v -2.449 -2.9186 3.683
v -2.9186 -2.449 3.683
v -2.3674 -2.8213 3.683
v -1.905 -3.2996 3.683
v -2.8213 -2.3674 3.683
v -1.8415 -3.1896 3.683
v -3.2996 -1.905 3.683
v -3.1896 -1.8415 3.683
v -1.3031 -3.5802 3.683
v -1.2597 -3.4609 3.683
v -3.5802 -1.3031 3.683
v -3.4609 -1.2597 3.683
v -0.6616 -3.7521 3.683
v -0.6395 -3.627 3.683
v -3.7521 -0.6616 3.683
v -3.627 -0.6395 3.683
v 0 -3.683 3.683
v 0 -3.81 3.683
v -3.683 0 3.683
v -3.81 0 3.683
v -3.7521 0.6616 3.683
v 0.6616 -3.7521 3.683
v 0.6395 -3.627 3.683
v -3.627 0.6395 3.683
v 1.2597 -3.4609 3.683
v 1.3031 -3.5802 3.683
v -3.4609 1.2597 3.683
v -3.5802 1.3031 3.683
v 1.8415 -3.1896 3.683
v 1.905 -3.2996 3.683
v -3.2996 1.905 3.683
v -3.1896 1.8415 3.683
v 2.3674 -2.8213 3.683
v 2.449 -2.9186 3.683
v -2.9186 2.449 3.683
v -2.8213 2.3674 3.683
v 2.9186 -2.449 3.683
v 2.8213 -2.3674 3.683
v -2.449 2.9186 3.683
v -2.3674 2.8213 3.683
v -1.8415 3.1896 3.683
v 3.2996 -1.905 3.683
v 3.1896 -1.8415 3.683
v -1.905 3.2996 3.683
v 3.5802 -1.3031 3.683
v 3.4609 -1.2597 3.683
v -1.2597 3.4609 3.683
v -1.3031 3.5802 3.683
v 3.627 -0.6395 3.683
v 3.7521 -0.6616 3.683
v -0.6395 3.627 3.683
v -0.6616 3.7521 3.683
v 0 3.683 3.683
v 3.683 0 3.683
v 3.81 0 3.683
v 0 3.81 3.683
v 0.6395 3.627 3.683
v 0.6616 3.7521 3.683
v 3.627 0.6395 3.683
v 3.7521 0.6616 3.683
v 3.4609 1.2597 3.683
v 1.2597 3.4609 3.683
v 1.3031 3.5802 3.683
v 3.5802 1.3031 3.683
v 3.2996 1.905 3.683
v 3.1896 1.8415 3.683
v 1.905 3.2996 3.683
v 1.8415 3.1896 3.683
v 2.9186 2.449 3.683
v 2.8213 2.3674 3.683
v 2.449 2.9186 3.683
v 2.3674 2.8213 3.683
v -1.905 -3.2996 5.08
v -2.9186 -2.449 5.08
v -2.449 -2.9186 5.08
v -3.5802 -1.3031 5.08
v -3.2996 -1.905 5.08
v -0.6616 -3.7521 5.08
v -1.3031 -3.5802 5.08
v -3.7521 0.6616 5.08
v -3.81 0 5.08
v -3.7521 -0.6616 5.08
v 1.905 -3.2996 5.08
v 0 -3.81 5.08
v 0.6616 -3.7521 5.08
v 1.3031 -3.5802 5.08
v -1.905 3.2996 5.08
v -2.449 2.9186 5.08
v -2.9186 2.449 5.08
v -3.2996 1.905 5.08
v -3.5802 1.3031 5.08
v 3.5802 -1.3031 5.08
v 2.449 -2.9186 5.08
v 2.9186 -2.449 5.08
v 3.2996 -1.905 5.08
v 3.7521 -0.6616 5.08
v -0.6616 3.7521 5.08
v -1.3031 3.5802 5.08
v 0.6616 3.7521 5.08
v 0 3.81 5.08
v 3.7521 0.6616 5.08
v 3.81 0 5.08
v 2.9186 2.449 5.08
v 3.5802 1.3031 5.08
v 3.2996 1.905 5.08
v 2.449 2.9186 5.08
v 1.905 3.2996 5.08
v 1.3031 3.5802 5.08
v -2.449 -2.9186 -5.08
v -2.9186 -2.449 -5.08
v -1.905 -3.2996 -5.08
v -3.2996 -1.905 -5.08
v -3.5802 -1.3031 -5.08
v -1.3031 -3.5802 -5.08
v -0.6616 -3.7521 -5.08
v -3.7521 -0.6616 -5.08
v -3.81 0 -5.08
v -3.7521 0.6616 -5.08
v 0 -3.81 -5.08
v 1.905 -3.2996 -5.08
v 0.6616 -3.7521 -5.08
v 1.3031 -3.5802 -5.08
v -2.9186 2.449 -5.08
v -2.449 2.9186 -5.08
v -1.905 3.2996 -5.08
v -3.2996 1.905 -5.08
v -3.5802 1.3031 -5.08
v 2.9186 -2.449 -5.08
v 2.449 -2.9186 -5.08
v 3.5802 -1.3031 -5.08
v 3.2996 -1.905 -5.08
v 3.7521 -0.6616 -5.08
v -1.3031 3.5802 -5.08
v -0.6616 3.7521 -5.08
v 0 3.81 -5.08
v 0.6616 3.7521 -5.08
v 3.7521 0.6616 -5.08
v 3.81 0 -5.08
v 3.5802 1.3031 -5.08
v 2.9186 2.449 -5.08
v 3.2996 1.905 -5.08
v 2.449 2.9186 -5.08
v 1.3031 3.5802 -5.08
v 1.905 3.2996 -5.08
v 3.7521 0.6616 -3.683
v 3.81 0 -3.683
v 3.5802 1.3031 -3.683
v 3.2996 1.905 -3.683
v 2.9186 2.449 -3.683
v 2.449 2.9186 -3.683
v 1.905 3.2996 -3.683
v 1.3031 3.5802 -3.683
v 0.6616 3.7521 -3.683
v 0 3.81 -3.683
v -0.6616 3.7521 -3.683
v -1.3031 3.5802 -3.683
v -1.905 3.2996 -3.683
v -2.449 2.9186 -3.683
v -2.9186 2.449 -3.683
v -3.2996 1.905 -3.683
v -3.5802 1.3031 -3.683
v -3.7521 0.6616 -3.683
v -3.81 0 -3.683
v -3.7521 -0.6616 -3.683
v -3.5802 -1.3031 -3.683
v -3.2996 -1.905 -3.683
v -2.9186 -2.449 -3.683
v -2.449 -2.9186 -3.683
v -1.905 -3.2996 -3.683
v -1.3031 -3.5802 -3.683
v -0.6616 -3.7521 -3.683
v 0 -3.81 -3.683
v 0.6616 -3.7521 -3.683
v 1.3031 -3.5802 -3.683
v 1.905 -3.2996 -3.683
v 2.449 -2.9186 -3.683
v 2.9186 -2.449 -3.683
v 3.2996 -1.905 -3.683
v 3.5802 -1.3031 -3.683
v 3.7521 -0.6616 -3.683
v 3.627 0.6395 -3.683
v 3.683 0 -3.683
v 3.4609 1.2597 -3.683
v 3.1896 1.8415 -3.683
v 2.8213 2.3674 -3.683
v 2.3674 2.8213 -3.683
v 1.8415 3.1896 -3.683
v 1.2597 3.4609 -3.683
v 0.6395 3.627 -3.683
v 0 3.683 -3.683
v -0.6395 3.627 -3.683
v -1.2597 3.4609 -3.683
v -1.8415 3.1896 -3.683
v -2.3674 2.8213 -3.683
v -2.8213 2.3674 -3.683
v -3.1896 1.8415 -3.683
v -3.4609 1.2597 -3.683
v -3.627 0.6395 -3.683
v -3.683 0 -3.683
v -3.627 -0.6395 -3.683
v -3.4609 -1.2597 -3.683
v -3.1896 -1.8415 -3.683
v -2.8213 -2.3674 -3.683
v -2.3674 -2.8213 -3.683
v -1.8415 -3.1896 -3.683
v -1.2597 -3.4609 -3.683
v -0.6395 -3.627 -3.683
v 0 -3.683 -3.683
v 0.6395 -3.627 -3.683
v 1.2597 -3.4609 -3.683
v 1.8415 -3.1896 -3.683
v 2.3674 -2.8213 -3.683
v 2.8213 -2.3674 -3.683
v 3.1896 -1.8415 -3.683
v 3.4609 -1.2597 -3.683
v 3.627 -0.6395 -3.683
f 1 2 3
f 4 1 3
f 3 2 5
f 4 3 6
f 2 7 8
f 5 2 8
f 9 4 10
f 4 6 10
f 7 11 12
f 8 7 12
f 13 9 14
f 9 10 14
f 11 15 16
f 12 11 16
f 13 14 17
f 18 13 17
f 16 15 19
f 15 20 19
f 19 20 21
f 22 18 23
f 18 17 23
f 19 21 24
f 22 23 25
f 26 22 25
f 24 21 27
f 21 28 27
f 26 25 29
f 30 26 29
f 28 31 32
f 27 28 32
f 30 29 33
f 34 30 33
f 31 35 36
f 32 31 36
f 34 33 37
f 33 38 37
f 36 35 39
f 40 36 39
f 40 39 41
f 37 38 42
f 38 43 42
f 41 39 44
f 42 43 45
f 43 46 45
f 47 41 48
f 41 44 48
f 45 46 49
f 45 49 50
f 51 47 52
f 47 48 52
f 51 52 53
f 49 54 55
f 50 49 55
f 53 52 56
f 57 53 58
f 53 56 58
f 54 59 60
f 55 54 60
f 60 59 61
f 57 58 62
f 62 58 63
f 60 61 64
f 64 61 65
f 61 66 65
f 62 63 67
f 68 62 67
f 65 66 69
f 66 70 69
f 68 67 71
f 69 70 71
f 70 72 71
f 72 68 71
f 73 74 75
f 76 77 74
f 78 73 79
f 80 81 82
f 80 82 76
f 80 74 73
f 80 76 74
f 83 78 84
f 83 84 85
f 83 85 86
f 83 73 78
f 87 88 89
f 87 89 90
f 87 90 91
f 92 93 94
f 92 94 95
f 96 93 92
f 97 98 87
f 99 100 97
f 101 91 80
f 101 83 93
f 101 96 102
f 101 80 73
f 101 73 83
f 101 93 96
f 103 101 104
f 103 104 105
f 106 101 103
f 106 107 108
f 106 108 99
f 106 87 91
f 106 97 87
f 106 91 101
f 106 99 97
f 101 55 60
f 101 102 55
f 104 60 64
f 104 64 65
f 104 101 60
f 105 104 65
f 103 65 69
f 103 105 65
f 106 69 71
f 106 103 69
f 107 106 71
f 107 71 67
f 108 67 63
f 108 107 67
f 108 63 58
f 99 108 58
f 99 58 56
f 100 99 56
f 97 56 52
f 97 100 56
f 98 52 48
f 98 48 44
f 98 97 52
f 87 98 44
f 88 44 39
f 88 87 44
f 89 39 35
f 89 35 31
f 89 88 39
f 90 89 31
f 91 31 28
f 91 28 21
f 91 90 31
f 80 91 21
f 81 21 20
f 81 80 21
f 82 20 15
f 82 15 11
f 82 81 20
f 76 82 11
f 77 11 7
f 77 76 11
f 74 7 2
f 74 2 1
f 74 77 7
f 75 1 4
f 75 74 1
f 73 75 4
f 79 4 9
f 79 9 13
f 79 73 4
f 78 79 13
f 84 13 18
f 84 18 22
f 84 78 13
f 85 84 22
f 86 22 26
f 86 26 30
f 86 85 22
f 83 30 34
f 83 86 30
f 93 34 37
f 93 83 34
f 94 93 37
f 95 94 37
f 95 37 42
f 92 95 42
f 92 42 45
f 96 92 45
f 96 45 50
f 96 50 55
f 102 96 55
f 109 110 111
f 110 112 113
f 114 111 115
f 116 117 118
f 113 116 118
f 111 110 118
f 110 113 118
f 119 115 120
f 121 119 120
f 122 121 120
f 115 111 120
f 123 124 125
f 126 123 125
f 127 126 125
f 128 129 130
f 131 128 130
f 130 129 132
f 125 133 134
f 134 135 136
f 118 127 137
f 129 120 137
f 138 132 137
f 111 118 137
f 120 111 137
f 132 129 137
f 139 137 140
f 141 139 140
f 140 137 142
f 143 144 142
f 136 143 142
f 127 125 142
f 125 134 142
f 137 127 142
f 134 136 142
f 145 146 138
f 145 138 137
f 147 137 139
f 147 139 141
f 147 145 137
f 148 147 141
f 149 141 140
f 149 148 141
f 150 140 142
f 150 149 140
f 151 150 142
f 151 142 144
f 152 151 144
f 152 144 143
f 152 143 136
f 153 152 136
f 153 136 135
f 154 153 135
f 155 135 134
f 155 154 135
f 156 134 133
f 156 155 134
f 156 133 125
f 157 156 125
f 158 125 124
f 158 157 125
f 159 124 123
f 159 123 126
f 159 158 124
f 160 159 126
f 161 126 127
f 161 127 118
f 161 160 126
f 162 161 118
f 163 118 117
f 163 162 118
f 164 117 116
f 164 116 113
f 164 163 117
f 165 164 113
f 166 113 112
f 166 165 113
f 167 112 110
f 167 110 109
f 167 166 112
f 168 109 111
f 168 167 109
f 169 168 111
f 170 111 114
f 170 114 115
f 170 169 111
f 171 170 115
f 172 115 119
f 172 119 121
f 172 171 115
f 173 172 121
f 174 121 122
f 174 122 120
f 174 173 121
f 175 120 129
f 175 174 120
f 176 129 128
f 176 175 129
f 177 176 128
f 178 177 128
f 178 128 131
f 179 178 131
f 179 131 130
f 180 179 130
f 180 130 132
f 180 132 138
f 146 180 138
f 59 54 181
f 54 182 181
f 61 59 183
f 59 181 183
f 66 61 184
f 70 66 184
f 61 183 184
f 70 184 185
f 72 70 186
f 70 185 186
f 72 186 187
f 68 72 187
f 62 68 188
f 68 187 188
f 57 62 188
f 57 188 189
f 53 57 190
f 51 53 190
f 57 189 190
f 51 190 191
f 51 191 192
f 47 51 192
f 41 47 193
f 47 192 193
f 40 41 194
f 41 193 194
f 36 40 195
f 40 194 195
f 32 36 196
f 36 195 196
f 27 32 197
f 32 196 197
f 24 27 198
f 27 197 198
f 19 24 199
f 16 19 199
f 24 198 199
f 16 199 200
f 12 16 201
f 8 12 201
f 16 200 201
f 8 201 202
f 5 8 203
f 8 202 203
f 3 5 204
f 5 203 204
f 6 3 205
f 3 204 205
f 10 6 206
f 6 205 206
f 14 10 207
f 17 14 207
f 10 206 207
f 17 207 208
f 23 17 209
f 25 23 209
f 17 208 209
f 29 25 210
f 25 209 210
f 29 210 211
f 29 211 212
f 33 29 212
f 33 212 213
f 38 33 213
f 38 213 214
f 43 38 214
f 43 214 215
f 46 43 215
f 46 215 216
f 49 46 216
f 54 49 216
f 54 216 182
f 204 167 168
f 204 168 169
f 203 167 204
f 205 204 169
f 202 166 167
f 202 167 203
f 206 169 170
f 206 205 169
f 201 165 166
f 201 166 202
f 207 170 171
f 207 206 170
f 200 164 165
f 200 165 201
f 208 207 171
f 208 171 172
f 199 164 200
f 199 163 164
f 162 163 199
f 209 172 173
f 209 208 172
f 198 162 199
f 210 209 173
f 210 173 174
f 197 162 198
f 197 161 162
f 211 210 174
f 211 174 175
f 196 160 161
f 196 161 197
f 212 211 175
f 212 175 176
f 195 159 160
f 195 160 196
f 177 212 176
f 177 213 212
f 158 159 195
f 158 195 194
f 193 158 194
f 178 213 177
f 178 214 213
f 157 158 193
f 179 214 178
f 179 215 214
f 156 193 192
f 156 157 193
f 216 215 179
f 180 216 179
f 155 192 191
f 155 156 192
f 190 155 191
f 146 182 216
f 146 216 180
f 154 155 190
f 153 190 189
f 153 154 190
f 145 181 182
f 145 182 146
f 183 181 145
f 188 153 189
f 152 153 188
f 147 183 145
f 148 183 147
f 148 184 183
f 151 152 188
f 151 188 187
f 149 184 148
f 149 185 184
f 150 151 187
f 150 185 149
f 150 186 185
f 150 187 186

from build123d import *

# Parameters (mm, degrees)
F0_R     = 3.81
F0_R_2   = 3.683
F1_DEPTH = 5.08
F2_DEPTH = 3.683


with BuildPart() as f1:
    # F0 (on Top) → F1 (new body, symmetric)
    with BuildSketch(Plane.XY):
        Circle(F0_R)
        Circle(F0_R_2, mode=Mode.SUBTRACT)
        Circle(F0_R_2)
    extrude(amount=F1_DEPTH, both=True)

    # F0 (on Top) → F2 (cut, symmetric)
    with BuildSketch(Plane.XY):
        Circle(F0_R)
        Circle(F0_R_2, mode=Mode.SUBTRACT)
    extrude(amount=F2_DEPTH, both=True, mode=Mode.SUBTRACT)


solid = f1.part
